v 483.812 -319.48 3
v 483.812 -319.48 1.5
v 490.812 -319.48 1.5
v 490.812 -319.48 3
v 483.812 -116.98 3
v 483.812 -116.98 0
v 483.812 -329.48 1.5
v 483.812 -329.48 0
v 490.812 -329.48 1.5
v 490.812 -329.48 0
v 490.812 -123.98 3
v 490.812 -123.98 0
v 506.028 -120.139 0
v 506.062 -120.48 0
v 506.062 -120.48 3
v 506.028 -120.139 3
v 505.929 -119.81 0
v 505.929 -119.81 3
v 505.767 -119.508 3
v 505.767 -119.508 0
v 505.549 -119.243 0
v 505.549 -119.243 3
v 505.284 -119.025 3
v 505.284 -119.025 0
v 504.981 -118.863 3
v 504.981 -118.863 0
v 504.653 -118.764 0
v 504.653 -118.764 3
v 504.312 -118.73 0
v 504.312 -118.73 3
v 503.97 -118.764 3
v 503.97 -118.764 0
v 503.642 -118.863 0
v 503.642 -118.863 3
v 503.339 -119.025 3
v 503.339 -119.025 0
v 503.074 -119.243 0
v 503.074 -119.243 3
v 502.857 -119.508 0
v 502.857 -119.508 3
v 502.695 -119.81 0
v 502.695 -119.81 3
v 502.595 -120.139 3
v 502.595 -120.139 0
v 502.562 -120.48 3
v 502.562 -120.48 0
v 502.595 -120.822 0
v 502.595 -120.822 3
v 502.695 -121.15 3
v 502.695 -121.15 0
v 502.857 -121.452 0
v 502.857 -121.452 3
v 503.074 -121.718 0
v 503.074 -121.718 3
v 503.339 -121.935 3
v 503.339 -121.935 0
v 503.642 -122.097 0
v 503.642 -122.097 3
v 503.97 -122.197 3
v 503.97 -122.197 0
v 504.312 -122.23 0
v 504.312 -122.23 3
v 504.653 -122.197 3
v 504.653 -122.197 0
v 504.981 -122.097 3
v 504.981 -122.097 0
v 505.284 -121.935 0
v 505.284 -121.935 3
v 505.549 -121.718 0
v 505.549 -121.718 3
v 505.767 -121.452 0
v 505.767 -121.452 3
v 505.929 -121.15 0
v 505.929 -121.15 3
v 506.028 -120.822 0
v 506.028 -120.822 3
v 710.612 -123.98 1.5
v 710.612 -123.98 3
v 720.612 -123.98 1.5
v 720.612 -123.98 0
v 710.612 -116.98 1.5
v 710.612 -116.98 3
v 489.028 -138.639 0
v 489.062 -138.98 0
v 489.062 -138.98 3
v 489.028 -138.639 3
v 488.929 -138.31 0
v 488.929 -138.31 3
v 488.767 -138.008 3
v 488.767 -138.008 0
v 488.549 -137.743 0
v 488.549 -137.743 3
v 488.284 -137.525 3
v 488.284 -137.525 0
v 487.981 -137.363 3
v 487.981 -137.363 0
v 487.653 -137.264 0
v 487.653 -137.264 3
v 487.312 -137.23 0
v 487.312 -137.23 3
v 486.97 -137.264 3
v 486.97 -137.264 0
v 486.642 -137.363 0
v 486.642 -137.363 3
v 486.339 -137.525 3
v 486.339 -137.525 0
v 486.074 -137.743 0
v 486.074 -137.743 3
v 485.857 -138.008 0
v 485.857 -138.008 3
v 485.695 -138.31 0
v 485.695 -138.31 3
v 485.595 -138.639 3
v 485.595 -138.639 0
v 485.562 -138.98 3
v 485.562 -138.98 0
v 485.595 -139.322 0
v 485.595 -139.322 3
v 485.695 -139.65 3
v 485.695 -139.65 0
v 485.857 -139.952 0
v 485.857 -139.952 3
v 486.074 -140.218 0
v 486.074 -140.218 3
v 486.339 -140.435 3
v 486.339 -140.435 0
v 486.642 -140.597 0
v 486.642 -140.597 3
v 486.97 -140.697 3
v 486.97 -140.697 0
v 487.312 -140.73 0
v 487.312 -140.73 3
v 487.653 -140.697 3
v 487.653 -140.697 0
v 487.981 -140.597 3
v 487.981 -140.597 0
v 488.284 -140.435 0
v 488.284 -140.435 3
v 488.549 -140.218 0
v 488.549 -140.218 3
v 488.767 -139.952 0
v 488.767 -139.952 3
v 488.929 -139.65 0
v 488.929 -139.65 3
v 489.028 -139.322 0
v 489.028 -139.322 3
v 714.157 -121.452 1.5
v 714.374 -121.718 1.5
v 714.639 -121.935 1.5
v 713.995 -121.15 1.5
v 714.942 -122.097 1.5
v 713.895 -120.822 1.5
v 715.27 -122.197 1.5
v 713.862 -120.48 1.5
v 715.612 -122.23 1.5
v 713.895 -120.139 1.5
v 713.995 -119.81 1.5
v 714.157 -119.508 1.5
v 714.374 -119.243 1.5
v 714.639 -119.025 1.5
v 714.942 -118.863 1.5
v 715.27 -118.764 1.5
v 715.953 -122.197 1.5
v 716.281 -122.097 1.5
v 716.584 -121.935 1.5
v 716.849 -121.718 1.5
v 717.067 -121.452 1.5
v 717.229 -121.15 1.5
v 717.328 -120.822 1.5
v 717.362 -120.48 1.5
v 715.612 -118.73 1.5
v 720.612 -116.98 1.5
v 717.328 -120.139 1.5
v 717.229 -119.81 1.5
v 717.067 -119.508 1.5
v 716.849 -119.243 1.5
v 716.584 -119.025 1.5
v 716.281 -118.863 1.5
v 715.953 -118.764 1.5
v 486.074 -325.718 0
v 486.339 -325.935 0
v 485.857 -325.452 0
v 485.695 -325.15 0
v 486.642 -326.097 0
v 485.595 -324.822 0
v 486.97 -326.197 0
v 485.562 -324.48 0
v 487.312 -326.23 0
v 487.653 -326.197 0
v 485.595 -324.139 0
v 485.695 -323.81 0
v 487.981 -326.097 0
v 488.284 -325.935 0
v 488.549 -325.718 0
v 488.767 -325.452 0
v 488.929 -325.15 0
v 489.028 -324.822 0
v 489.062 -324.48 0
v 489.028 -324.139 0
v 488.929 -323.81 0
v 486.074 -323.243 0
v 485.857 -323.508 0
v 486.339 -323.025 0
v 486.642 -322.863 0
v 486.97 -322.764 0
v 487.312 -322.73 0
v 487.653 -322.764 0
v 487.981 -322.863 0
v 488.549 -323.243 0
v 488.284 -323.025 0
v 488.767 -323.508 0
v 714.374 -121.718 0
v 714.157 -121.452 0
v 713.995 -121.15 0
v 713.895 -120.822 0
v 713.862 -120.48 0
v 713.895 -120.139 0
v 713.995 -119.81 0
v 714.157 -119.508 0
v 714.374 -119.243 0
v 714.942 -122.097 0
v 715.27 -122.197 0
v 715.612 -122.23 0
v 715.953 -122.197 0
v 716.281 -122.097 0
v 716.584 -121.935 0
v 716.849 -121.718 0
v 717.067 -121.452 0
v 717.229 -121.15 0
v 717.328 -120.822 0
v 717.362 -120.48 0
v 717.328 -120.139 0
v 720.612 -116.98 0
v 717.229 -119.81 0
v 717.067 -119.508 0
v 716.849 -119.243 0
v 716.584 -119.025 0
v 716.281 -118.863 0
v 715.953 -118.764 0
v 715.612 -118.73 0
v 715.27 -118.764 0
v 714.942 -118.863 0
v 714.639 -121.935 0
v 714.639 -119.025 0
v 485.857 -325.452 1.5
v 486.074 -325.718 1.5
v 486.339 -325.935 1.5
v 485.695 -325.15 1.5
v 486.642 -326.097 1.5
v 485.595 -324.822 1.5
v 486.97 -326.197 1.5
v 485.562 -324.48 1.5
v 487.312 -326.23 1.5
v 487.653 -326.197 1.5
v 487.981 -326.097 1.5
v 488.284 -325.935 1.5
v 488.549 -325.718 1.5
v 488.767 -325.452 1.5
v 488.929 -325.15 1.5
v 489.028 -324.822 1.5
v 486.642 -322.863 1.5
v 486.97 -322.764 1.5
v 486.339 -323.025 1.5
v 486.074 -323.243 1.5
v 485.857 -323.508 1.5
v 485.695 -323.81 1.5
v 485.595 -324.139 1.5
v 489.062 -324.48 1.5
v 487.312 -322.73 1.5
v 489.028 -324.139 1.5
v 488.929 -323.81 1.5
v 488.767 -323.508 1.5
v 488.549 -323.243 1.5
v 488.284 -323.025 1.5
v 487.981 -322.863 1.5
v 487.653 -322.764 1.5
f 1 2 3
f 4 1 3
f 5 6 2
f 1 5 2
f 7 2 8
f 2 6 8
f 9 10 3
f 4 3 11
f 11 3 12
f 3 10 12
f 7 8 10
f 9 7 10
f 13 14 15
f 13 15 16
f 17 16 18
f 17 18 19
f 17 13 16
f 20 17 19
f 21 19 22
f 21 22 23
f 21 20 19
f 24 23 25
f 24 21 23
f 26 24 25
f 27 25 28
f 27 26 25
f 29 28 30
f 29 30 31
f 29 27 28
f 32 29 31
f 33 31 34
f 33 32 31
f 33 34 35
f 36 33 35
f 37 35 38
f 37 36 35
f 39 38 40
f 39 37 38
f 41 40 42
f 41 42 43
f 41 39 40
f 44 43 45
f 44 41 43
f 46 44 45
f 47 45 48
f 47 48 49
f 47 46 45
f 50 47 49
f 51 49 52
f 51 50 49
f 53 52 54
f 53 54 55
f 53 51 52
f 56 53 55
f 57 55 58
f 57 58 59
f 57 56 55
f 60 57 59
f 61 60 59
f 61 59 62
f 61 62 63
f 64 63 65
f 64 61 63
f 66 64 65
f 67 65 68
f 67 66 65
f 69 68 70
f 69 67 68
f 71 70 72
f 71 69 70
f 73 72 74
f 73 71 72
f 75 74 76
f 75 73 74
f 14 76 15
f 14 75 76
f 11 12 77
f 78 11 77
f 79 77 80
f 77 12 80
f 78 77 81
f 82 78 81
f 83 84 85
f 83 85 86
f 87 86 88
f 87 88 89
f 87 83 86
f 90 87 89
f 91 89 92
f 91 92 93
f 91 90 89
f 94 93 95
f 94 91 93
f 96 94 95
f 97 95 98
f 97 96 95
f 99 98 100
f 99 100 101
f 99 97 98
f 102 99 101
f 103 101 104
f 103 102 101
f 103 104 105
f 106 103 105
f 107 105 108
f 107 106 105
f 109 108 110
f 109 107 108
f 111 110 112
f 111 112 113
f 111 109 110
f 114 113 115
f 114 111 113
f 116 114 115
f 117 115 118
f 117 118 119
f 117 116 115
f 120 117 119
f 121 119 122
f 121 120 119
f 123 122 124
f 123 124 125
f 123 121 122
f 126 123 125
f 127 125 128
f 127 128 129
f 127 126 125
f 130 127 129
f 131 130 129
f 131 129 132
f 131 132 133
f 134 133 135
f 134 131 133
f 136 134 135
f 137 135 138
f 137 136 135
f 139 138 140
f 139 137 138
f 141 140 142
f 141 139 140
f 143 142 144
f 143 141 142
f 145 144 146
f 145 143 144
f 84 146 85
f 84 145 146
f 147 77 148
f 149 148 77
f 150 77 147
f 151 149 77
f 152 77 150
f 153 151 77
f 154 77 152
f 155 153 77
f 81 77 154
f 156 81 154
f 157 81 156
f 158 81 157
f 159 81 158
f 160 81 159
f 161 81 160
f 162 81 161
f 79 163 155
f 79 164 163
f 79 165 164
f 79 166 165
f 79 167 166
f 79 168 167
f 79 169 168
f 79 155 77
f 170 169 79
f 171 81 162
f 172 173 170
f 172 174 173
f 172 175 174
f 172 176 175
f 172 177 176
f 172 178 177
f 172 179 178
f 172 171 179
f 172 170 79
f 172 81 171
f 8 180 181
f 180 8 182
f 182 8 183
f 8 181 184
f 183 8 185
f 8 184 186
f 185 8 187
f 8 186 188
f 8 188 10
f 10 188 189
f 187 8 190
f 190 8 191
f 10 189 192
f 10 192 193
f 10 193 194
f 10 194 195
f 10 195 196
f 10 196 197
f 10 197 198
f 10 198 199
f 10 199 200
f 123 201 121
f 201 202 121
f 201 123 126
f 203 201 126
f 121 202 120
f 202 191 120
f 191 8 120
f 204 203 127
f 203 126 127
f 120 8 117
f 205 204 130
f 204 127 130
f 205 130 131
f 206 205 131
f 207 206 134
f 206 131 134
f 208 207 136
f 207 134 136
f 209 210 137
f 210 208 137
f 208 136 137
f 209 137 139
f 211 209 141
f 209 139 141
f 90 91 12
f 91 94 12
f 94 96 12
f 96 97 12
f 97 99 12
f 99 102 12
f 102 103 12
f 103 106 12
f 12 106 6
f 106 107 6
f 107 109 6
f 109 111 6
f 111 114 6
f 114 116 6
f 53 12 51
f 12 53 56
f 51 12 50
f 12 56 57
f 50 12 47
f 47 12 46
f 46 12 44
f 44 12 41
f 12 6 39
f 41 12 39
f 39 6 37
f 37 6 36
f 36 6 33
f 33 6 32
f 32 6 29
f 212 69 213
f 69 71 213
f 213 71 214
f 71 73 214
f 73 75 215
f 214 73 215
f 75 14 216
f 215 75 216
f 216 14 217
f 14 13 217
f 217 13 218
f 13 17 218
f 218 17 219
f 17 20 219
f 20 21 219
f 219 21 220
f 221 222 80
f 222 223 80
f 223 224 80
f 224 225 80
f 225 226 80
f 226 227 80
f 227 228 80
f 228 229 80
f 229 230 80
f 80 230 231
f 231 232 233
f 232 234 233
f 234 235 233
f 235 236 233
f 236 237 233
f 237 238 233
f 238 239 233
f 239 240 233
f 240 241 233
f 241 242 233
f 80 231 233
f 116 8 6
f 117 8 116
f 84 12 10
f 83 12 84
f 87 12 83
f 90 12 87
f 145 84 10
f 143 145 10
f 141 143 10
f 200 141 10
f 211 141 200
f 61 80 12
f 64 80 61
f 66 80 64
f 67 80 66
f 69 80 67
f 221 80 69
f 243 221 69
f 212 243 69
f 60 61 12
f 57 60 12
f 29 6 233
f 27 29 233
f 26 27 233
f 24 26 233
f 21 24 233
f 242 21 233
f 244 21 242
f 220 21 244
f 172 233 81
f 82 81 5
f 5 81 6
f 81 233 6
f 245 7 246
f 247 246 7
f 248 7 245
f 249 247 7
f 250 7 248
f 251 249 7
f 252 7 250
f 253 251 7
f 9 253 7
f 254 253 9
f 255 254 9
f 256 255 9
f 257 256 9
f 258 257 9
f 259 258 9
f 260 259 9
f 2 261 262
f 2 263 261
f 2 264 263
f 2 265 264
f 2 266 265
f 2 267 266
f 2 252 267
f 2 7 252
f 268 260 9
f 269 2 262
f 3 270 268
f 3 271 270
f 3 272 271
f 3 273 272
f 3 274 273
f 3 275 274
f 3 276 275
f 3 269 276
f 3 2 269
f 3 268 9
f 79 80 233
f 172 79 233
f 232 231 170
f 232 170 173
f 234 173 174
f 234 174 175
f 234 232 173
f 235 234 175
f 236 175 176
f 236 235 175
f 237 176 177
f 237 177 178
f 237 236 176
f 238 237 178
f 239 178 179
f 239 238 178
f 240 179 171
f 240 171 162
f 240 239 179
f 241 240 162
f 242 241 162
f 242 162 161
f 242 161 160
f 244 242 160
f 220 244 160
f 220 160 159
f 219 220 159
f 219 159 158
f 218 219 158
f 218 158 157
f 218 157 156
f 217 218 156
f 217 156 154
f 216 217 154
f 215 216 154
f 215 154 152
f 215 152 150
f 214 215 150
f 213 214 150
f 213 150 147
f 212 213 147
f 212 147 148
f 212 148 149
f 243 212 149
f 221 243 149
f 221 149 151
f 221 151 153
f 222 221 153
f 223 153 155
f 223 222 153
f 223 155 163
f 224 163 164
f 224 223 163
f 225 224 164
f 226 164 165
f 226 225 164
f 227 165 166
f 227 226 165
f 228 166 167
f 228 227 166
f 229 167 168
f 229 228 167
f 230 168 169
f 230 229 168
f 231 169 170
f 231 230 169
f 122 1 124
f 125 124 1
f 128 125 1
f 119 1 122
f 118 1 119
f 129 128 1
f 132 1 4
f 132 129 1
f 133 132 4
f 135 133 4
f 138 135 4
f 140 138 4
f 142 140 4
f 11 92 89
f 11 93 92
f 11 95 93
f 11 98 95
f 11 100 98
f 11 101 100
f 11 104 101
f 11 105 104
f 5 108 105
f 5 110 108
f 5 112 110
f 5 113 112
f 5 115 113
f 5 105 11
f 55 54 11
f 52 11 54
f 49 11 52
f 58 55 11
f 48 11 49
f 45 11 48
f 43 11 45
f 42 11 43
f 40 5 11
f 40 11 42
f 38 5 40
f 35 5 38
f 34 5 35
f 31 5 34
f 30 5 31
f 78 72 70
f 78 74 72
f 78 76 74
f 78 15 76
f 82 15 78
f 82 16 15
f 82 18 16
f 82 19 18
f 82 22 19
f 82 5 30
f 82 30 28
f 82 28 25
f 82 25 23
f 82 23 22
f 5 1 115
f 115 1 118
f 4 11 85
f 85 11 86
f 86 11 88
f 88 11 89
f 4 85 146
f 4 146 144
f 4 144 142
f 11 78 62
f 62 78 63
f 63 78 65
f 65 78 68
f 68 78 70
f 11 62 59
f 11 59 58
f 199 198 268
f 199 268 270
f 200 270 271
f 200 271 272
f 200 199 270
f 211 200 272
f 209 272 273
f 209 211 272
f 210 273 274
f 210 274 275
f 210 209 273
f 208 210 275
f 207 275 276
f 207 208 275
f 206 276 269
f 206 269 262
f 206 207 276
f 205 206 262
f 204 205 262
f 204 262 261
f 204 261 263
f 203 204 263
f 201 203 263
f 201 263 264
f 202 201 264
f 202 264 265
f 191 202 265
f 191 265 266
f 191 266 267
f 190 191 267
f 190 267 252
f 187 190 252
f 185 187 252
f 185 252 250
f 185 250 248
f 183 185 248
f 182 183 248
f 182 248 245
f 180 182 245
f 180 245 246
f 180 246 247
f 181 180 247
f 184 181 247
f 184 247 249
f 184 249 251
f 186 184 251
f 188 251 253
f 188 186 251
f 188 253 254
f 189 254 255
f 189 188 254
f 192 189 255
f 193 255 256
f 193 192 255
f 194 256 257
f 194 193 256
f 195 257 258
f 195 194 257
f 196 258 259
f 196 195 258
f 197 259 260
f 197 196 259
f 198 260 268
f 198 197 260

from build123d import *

# Parameters (mm, degrees)
CROQUIS3_R              = 1.75
SALIENTE_EXTRUIR1_DEPTH = 3
CORTAR_EXTRUIR1_START   = -1.5
CROQUIS4_W              = 7
CROQUIS4_H              = 10
CROQUIS4_R              = 1.75
CROQUIS4_W_2            = 10
CROQUIS4_H_2            = 7
CORTAR_EXTRUIR1_DEPTH   = 1.5


with BuildPart() as part:
    # Croquis3 → Saliente-Extruir1 (new body)
    with BuildSketch(Plane.XY):
        Polygon((483.811741117, -116.980180132), (483.811741117, -329.480180132), (490.811741117, -329.480180132), (490.811741117, -123.980180132), (720.611741117, -123.980180132), (720.611741117, -116.980180132), align=None)
        with Locations((487.311741117, -138.980180132)):
            Circle(CROQUIS3_R, mode=Mode.SUBTRACT)
        with Locations((487.311741117, -324.480180132)):
            Circle(CROQUIS3_R, mode=Mode.SUBTRACT)
        with Locations((504.311741117, -120.480180132)):
            Circle(CROQUIS3_R, mode=Mode.SUBTRACT)
        with Locations((715.611741117, -120.480180132)):
            Circle(CROQUIS3_R, mode=Mode.SUBTRACT)
    extrude(amount=SALIENTE_EXTRUIR1_DEPTH)

    # Croquis4 → Cortar-Extruir1 (cut)
    # profile 1 of 2: a face of its own
    with BuildSketch(Plane.XY.offset(3).offset(CORTAR_EXTRUIR1_START)):
        with Locations((487.311741117, -324.480180132)):
            Rectangle(CROQUIS4_W, CROQUIS4_H)
        with Locations((487.311741117, -324.480180132)):
            Circle(CROQUIS4_R, mode=Mode.SUBTRACT)
    # profile 2 of 2: a face of its own
    with BuildSketch(Plane.XY.offset(3).offset(CORTAR_EXTRUIR1_START)):
        with Locations((715.611741117, -120.480180132)):
            Rectangle(CROQUIS4_W_2, CROQUIS4_H_2)
        with Locations((715.611741117, -120.480180132)):
            Circle(CROQUIS4_R, mode=Mode.SUBTRACT)
    extrude(amount=CORTAR_EXTRUIR1_DEPTH, mode=Mode.SUBTRACT)


solid = part.part
